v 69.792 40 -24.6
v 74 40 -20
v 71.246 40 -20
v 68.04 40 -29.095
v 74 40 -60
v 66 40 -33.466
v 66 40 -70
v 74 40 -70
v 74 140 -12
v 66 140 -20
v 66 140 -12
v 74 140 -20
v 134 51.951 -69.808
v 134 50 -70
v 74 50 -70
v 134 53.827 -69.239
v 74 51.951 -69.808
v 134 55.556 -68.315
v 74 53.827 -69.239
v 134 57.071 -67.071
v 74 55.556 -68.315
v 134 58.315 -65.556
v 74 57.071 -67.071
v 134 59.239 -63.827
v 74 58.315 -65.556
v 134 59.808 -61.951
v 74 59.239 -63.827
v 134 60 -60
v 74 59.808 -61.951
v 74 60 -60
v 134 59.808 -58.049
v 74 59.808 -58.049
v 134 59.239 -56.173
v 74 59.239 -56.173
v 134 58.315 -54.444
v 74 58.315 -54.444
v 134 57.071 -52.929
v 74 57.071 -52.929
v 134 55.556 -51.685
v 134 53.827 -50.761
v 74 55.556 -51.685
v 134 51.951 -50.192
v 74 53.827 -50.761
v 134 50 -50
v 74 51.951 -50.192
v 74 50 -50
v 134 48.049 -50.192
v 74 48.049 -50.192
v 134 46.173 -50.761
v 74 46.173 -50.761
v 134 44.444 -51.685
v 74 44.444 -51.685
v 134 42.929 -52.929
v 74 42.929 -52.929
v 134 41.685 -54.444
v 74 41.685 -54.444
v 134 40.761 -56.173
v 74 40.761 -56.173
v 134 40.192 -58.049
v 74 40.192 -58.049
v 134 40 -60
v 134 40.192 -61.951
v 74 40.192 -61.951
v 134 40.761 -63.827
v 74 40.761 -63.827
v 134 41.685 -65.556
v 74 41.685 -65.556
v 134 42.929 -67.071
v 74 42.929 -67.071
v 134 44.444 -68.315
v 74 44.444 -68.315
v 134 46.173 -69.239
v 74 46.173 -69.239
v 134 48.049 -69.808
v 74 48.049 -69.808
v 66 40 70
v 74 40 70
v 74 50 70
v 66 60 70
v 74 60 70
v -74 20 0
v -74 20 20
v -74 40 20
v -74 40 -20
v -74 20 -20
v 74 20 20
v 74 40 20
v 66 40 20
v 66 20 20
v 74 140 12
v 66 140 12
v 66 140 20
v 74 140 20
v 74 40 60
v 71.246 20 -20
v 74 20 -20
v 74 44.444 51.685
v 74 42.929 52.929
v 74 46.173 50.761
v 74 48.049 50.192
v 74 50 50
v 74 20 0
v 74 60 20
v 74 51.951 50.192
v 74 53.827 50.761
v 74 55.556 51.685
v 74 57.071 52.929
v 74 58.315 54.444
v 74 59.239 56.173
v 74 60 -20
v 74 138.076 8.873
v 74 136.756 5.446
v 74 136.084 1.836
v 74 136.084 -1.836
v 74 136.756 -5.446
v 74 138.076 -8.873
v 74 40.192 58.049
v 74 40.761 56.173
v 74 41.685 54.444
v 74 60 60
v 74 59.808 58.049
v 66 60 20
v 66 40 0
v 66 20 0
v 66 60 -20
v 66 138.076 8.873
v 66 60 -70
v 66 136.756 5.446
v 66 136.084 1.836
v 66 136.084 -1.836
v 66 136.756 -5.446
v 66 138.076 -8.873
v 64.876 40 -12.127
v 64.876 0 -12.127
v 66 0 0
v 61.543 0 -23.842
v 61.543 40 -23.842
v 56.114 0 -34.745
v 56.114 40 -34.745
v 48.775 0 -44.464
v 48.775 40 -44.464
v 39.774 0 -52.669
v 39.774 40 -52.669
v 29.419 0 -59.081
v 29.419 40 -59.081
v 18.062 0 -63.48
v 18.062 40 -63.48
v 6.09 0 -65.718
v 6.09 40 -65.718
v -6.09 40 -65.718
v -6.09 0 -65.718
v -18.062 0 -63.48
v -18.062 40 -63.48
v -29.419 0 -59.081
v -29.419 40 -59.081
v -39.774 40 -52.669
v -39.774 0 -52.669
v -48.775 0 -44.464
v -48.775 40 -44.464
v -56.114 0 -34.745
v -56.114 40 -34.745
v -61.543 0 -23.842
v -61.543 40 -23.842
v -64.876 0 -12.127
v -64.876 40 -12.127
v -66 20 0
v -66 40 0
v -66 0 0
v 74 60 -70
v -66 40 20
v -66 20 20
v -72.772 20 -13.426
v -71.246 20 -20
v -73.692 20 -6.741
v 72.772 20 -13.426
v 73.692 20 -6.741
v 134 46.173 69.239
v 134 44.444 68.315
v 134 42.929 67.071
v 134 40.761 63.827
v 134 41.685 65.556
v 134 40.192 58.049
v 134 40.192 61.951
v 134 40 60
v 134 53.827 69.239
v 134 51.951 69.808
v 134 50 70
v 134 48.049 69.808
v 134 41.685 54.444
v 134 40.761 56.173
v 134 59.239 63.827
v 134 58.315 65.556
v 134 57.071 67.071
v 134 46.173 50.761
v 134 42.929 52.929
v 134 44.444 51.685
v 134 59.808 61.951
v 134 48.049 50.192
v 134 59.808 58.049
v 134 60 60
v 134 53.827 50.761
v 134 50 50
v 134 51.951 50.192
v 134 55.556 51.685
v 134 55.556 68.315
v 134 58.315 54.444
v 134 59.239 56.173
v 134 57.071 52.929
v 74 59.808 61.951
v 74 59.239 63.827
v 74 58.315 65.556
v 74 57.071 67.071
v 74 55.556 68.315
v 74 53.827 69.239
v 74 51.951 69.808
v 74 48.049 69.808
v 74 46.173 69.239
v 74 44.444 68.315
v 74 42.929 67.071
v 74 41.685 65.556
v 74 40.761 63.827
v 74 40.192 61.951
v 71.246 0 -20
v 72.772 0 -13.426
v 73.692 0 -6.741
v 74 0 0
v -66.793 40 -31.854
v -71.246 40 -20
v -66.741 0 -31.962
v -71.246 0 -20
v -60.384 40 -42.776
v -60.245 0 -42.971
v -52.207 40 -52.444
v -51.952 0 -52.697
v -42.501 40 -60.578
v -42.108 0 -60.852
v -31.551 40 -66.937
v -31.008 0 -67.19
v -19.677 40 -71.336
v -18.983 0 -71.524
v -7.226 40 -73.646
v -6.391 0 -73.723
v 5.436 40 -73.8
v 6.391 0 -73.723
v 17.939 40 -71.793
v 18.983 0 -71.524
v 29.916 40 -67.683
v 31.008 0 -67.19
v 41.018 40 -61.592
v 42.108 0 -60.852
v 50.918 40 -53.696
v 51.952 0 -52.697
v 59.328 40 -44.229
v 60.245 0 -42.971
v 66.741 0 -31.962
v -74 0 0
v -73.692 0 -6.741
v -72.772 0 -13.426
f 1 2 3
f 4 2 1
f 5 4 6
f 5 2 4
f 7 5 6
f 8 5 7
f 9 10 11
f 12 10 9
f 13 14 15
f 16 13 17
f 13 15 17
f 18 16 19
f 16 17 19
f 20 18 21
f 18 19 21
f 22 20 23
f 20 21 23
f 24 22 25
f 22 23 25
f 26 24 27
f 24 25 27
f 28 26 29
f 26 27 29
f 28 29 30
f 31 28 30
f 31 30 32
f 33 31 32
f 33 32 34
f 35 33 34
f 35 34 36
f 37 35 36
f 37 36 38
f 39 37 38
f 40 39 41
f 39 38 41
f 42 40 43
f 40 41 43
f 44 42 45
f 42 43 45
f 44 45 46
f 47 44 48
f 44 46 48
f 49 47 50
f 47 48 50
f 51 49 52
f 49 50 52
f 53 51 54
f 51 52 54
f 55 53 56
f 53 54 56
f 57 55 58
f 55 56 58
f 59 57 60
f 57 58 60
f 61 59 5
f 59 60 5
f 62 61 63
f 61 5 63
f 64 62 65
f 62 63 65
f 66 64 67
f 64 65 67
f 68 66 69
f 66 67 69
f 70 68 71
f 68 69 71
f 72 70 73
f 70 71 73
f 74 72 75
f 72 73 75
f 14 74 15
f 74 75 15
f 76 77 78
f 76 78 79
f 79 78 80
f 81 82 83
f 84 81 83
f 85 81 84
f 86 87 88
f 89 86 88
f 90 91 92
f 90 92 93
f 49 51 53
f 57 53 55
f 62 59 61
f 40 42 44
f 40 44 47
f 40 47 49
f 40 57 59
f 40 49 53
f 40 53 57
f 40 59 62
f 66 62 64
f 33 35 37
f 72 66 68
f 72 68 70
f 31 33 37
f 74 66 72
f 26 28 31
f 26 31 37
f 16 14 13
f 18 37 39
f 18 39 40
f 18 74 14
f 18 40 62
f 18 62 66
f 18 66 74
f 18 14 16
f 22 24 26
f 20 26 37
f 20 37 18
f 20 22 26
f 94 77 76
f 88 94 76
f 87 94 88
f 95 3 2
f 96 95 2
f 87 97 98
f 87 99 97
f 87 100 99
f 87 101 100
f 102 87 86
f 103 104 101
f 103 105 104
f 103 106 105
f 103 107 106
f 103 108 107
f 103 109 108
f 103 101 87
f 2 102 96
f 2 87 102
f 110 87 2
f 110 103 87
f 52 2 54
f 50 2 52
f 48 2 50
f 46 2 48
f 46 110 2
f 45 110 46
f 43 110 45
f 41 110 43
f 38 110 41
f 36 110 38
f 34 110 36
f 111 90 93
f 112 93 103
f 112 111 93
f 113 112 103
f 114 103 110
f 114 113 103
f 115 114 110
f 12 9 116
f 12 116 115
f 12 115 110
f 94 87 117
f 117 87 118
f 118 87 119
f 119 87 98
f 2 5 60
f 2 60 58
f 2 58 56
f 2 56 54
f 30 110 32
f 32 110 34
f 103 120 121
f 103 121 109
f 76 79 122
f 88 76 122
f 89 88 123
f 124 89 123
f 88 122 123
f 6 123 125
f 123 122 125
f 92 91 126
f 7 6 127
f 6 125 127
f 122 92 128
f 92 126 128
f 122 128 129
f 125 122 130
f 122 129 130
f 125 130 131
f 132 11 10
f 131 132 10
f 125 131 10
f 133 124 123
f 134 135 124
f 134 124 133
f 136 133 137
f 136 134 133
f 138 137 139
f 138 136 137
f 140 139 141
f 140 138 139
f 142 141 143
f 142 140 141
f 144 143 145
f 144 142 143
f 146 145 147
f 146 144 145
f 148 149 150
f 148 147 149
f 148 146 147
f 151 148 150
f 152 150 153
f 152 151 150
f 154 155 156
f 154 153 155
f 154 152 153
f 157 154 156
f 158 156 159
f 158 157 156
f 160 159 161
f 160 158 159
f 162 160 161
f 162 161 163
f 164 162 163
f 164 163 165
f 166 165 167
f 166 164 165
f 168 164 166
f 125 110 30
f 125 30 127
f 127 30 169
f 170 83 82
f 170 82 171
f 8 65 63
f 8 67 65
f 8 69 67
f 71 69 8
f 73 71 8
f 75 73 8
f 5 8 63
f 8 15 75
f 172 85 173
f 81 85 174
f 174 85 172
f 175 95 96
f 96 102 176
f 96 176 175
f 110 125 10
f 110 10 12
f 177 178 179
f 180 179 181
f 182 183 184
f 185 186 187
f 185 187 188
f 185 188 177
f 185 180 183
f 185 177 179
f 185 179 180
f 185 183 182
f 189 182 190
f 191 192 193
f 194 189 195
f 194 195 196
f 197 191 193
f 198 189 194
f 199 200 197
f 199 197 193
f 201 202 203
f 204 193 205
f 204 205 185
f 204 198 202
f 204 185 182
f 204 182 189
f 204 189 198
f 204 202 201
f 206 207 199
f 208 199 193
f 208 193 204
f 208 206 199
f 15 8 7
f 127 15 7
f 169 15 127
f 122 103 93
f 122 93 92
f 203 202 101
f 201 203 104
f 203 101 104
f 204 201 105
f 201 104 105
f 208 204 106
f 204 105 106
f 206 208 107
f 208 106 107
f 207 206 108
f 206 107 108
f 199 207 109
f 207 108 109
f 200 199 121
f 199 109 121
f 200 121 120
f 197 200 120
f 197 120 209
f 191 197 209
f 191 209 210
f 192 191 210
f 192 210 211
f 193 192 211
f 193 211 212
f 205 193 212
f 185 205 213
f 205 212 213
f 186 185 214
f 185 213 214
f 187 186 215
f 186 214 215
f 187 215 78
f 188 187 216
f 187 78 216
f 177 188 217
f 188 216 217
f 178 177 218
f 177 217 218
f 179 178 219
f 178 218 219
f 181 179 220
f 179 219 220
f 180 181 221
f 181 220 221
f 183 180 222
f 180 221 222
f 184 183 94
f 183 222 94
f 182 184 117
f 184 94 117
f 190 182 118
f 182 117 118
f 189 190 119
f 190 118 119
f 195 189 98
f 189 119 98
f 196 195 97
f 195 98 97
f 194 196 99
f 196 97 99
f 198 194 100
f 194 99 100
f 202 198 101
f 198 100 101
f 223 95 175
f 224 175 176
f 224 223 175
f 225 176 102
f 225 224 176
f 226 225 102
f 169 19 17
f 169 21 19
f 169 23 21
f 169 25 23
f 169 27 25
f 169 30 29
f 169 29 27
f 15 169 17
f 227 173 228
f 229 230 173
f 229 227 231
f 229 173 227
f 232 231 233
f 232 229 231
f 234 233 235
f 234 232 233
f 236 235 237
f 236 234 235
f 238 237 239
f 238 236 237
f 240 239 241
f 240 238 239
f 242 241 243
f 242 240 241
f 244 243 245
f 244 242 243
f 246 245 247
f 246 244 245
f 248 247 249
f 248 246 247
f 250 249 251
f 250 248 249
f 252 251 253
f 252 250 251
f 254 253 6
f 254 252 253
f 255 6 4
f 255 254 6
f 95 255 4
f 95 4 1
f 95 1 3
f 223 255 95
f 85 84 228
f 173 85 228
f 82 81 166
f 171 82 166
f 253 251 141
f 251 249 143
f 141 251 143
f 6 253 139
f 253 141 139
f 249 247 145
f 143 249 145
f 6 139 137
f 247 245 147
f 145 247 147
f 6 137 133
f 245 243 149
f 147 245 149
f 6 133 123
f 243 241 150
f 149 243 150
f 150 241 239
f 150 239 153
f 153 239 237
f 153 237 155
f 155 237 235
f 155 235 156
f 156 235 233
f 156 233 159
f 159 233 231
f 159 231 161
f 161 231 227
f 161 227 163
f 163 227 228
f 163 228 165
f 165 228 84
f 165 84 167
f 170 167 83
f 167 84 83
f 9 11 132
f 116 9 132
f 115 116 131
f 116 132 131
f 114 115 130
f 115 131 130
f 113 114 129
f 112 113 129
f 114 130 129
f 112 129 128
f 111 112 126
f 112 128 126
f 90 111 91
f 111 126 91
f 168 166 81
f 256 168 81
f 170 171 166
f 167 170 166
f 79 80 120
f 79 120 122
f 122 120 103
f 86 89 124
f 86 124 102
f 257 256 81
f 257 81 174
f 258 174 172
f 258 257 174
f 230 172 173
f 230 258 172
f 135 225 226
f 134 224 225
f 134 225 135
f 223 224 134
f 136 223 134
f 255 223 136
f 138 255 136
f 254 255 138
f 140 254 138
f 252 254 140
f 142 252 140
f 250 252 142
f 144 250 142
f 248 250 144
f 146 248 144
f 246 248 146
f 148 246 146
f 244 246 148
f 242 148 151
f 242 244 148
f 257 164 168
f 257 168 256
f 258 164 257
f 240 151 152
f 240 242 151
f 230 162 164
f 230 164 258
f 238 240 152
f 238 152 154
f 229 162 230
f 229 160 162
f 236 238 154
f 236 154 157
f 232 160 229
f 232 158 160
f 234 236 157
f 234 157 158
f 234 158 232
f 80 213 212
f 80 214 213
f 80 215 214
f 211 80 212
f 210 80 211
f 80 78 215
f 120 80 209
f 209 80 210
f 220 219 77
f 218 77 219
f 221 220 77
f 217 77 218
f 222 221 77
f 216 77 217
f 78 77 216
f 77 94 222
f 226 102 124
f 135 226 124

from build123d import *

# Parameters (mm, degrees)
EXTRUDE_1_DEPTH     = 40
SKETCH_2_W          = 8
SKETCH_2_H          = 40
EXTRUDE_2_DEPTH     = 100
SKETCH_3_R          = 20
CUT_EXTRUDE_1_DEPTH = 149
SKETCH_4_W          = 49.783903804
SKETCH_4_H          = 113.982309312
CUT_EXTRUDE_3_DEPTH = 10
SKETCH_5_R          = 84.762192866
CUT_EXTRUDE_4_DEPTH = 20
SKETCH_6_W          = 140
SKETCH_6_H          = 20
EXTRUDE_3_DEPTH     = 8
SKETCH_7_R          = 10
EXTRUDE_4_DEPTH     = 60


with BuildPart() as part:
    # 草图1 → 凸台-拉伸1 (new body)
    with BuildSketch(Plane(origin=(0, 0, 0), x_dir=(1, 0, 0), z_dir=(0, 1, 0))):
        with BuildLine():
            Line((-74, 20), (-71.246052522, 20))
            ThreePointArc((-71.246052522, 20), (0, 74), (71.246052522, 20))
            Line((71.246052522, 20), (74, 20))
            Line((74, 20), (74, -20))
            Line((74, -20), (66, -20))
            Line((66, -20), (66, 0))
            ThreePointArc((66, 0), (0, 66), (-66, 0))
            Line((-66, 0), (-66, -20))
            Line((-66, -20), (-74, -20))
            Line((-74, -20), (-74, 20))
        make_face()
    extrude(amount=EXTRUDE_1_DEPTH)

    # 草图2 → 凸台-拉伸2 (add)
    with BuildSketch(Plane(origin=(0, 40, 0), x_dir=(1, 0, 0), z_dir=(0, 1, 0))):
        with Locations((-70, 0)):
            Rectangle(SKETCH_2_W, SKETCH_2_H)
        with Locations((70, 0)):
            Rectangle(SKETCH_2_W, SKETCH_2_H)
    extrude(amount=EXTRUDE_2_DEPTH)

    # 草图3 → 切除-拉伸1 (cut, through all)
    with BuildSketch(Plane.ZY.offset(74)):
        with Locations((0, 156)):
            Circle(SKETCH_3_R)
    extrude(amount=-CUT_EXTRUDE_1_DEPTH, mode=Mode.SUBTRACT)

    # 草图4 → 切除-拉伸3 (cut)
    with BuildSketch(Plane.ZY.offset(74)):
        with Locations((4.891951902, 96.991154656)):
            Rectangle(SKETCH_4_W, SKETCH_4_H)
    extrude(amount=-CUT_EXTRUDE_3_DEPTH, mode=Mode.SUBTRACT)

    # 草图5 → 切除-拉伸4 (cut)
    with BuildSketch(Plane.XZ):
        Circle(SKETCH_5_R)
        with BuildLine():
            Line((-71.246052522, 20), (-66, 20))
            Line((-66, 20), (-66, 0))
            Line((-66, 0), (-74, 0))
            ThreePointArc((-74, 0), (0, -74), (74, 0))
            Line((74, 0), (66, 0))
            Line((66, 0), (66, 20))
            Line((66, 20), (71.246052522, 20))
            ThreePointArc((71.246052522, 20), (0, 74), (-71.246052522, 20))
        make_face(mode=Mode.SUBTRACT)
    extrude(amount=-CUT_EXTRUDE_4_DEPTH, mode=Mode.SUBTRACT)

    # 草图6 → 凸台-拉伸3 (add)
    with BuildSketch(Plane(origin=(74, 0, 0), x_dir=(0, 0, -1), z_dir=(1, 0, 0))):
        with Locations((0, 50)):
            Rectangle(SKETCH_6_W, SKETCH_6_H)
    extrude(amount=-EXTRUDE_3_DEPTH)

    # 草图7 → 凸台-拉伸4 (add)
    with BuildSketch(Plane(origin=(74, 0, 0), x_dir=(0, 0, -1), z_dir=(1, 0, 0))):
        with Locations((-60, 50)):
            Circle(SKETCH_7_R)
        with Locations((60, 50)):
            Circle(SKETCH_7_R)
    extrude(amount=EXTRUDE_4_DEPTH)


solid = part.part
